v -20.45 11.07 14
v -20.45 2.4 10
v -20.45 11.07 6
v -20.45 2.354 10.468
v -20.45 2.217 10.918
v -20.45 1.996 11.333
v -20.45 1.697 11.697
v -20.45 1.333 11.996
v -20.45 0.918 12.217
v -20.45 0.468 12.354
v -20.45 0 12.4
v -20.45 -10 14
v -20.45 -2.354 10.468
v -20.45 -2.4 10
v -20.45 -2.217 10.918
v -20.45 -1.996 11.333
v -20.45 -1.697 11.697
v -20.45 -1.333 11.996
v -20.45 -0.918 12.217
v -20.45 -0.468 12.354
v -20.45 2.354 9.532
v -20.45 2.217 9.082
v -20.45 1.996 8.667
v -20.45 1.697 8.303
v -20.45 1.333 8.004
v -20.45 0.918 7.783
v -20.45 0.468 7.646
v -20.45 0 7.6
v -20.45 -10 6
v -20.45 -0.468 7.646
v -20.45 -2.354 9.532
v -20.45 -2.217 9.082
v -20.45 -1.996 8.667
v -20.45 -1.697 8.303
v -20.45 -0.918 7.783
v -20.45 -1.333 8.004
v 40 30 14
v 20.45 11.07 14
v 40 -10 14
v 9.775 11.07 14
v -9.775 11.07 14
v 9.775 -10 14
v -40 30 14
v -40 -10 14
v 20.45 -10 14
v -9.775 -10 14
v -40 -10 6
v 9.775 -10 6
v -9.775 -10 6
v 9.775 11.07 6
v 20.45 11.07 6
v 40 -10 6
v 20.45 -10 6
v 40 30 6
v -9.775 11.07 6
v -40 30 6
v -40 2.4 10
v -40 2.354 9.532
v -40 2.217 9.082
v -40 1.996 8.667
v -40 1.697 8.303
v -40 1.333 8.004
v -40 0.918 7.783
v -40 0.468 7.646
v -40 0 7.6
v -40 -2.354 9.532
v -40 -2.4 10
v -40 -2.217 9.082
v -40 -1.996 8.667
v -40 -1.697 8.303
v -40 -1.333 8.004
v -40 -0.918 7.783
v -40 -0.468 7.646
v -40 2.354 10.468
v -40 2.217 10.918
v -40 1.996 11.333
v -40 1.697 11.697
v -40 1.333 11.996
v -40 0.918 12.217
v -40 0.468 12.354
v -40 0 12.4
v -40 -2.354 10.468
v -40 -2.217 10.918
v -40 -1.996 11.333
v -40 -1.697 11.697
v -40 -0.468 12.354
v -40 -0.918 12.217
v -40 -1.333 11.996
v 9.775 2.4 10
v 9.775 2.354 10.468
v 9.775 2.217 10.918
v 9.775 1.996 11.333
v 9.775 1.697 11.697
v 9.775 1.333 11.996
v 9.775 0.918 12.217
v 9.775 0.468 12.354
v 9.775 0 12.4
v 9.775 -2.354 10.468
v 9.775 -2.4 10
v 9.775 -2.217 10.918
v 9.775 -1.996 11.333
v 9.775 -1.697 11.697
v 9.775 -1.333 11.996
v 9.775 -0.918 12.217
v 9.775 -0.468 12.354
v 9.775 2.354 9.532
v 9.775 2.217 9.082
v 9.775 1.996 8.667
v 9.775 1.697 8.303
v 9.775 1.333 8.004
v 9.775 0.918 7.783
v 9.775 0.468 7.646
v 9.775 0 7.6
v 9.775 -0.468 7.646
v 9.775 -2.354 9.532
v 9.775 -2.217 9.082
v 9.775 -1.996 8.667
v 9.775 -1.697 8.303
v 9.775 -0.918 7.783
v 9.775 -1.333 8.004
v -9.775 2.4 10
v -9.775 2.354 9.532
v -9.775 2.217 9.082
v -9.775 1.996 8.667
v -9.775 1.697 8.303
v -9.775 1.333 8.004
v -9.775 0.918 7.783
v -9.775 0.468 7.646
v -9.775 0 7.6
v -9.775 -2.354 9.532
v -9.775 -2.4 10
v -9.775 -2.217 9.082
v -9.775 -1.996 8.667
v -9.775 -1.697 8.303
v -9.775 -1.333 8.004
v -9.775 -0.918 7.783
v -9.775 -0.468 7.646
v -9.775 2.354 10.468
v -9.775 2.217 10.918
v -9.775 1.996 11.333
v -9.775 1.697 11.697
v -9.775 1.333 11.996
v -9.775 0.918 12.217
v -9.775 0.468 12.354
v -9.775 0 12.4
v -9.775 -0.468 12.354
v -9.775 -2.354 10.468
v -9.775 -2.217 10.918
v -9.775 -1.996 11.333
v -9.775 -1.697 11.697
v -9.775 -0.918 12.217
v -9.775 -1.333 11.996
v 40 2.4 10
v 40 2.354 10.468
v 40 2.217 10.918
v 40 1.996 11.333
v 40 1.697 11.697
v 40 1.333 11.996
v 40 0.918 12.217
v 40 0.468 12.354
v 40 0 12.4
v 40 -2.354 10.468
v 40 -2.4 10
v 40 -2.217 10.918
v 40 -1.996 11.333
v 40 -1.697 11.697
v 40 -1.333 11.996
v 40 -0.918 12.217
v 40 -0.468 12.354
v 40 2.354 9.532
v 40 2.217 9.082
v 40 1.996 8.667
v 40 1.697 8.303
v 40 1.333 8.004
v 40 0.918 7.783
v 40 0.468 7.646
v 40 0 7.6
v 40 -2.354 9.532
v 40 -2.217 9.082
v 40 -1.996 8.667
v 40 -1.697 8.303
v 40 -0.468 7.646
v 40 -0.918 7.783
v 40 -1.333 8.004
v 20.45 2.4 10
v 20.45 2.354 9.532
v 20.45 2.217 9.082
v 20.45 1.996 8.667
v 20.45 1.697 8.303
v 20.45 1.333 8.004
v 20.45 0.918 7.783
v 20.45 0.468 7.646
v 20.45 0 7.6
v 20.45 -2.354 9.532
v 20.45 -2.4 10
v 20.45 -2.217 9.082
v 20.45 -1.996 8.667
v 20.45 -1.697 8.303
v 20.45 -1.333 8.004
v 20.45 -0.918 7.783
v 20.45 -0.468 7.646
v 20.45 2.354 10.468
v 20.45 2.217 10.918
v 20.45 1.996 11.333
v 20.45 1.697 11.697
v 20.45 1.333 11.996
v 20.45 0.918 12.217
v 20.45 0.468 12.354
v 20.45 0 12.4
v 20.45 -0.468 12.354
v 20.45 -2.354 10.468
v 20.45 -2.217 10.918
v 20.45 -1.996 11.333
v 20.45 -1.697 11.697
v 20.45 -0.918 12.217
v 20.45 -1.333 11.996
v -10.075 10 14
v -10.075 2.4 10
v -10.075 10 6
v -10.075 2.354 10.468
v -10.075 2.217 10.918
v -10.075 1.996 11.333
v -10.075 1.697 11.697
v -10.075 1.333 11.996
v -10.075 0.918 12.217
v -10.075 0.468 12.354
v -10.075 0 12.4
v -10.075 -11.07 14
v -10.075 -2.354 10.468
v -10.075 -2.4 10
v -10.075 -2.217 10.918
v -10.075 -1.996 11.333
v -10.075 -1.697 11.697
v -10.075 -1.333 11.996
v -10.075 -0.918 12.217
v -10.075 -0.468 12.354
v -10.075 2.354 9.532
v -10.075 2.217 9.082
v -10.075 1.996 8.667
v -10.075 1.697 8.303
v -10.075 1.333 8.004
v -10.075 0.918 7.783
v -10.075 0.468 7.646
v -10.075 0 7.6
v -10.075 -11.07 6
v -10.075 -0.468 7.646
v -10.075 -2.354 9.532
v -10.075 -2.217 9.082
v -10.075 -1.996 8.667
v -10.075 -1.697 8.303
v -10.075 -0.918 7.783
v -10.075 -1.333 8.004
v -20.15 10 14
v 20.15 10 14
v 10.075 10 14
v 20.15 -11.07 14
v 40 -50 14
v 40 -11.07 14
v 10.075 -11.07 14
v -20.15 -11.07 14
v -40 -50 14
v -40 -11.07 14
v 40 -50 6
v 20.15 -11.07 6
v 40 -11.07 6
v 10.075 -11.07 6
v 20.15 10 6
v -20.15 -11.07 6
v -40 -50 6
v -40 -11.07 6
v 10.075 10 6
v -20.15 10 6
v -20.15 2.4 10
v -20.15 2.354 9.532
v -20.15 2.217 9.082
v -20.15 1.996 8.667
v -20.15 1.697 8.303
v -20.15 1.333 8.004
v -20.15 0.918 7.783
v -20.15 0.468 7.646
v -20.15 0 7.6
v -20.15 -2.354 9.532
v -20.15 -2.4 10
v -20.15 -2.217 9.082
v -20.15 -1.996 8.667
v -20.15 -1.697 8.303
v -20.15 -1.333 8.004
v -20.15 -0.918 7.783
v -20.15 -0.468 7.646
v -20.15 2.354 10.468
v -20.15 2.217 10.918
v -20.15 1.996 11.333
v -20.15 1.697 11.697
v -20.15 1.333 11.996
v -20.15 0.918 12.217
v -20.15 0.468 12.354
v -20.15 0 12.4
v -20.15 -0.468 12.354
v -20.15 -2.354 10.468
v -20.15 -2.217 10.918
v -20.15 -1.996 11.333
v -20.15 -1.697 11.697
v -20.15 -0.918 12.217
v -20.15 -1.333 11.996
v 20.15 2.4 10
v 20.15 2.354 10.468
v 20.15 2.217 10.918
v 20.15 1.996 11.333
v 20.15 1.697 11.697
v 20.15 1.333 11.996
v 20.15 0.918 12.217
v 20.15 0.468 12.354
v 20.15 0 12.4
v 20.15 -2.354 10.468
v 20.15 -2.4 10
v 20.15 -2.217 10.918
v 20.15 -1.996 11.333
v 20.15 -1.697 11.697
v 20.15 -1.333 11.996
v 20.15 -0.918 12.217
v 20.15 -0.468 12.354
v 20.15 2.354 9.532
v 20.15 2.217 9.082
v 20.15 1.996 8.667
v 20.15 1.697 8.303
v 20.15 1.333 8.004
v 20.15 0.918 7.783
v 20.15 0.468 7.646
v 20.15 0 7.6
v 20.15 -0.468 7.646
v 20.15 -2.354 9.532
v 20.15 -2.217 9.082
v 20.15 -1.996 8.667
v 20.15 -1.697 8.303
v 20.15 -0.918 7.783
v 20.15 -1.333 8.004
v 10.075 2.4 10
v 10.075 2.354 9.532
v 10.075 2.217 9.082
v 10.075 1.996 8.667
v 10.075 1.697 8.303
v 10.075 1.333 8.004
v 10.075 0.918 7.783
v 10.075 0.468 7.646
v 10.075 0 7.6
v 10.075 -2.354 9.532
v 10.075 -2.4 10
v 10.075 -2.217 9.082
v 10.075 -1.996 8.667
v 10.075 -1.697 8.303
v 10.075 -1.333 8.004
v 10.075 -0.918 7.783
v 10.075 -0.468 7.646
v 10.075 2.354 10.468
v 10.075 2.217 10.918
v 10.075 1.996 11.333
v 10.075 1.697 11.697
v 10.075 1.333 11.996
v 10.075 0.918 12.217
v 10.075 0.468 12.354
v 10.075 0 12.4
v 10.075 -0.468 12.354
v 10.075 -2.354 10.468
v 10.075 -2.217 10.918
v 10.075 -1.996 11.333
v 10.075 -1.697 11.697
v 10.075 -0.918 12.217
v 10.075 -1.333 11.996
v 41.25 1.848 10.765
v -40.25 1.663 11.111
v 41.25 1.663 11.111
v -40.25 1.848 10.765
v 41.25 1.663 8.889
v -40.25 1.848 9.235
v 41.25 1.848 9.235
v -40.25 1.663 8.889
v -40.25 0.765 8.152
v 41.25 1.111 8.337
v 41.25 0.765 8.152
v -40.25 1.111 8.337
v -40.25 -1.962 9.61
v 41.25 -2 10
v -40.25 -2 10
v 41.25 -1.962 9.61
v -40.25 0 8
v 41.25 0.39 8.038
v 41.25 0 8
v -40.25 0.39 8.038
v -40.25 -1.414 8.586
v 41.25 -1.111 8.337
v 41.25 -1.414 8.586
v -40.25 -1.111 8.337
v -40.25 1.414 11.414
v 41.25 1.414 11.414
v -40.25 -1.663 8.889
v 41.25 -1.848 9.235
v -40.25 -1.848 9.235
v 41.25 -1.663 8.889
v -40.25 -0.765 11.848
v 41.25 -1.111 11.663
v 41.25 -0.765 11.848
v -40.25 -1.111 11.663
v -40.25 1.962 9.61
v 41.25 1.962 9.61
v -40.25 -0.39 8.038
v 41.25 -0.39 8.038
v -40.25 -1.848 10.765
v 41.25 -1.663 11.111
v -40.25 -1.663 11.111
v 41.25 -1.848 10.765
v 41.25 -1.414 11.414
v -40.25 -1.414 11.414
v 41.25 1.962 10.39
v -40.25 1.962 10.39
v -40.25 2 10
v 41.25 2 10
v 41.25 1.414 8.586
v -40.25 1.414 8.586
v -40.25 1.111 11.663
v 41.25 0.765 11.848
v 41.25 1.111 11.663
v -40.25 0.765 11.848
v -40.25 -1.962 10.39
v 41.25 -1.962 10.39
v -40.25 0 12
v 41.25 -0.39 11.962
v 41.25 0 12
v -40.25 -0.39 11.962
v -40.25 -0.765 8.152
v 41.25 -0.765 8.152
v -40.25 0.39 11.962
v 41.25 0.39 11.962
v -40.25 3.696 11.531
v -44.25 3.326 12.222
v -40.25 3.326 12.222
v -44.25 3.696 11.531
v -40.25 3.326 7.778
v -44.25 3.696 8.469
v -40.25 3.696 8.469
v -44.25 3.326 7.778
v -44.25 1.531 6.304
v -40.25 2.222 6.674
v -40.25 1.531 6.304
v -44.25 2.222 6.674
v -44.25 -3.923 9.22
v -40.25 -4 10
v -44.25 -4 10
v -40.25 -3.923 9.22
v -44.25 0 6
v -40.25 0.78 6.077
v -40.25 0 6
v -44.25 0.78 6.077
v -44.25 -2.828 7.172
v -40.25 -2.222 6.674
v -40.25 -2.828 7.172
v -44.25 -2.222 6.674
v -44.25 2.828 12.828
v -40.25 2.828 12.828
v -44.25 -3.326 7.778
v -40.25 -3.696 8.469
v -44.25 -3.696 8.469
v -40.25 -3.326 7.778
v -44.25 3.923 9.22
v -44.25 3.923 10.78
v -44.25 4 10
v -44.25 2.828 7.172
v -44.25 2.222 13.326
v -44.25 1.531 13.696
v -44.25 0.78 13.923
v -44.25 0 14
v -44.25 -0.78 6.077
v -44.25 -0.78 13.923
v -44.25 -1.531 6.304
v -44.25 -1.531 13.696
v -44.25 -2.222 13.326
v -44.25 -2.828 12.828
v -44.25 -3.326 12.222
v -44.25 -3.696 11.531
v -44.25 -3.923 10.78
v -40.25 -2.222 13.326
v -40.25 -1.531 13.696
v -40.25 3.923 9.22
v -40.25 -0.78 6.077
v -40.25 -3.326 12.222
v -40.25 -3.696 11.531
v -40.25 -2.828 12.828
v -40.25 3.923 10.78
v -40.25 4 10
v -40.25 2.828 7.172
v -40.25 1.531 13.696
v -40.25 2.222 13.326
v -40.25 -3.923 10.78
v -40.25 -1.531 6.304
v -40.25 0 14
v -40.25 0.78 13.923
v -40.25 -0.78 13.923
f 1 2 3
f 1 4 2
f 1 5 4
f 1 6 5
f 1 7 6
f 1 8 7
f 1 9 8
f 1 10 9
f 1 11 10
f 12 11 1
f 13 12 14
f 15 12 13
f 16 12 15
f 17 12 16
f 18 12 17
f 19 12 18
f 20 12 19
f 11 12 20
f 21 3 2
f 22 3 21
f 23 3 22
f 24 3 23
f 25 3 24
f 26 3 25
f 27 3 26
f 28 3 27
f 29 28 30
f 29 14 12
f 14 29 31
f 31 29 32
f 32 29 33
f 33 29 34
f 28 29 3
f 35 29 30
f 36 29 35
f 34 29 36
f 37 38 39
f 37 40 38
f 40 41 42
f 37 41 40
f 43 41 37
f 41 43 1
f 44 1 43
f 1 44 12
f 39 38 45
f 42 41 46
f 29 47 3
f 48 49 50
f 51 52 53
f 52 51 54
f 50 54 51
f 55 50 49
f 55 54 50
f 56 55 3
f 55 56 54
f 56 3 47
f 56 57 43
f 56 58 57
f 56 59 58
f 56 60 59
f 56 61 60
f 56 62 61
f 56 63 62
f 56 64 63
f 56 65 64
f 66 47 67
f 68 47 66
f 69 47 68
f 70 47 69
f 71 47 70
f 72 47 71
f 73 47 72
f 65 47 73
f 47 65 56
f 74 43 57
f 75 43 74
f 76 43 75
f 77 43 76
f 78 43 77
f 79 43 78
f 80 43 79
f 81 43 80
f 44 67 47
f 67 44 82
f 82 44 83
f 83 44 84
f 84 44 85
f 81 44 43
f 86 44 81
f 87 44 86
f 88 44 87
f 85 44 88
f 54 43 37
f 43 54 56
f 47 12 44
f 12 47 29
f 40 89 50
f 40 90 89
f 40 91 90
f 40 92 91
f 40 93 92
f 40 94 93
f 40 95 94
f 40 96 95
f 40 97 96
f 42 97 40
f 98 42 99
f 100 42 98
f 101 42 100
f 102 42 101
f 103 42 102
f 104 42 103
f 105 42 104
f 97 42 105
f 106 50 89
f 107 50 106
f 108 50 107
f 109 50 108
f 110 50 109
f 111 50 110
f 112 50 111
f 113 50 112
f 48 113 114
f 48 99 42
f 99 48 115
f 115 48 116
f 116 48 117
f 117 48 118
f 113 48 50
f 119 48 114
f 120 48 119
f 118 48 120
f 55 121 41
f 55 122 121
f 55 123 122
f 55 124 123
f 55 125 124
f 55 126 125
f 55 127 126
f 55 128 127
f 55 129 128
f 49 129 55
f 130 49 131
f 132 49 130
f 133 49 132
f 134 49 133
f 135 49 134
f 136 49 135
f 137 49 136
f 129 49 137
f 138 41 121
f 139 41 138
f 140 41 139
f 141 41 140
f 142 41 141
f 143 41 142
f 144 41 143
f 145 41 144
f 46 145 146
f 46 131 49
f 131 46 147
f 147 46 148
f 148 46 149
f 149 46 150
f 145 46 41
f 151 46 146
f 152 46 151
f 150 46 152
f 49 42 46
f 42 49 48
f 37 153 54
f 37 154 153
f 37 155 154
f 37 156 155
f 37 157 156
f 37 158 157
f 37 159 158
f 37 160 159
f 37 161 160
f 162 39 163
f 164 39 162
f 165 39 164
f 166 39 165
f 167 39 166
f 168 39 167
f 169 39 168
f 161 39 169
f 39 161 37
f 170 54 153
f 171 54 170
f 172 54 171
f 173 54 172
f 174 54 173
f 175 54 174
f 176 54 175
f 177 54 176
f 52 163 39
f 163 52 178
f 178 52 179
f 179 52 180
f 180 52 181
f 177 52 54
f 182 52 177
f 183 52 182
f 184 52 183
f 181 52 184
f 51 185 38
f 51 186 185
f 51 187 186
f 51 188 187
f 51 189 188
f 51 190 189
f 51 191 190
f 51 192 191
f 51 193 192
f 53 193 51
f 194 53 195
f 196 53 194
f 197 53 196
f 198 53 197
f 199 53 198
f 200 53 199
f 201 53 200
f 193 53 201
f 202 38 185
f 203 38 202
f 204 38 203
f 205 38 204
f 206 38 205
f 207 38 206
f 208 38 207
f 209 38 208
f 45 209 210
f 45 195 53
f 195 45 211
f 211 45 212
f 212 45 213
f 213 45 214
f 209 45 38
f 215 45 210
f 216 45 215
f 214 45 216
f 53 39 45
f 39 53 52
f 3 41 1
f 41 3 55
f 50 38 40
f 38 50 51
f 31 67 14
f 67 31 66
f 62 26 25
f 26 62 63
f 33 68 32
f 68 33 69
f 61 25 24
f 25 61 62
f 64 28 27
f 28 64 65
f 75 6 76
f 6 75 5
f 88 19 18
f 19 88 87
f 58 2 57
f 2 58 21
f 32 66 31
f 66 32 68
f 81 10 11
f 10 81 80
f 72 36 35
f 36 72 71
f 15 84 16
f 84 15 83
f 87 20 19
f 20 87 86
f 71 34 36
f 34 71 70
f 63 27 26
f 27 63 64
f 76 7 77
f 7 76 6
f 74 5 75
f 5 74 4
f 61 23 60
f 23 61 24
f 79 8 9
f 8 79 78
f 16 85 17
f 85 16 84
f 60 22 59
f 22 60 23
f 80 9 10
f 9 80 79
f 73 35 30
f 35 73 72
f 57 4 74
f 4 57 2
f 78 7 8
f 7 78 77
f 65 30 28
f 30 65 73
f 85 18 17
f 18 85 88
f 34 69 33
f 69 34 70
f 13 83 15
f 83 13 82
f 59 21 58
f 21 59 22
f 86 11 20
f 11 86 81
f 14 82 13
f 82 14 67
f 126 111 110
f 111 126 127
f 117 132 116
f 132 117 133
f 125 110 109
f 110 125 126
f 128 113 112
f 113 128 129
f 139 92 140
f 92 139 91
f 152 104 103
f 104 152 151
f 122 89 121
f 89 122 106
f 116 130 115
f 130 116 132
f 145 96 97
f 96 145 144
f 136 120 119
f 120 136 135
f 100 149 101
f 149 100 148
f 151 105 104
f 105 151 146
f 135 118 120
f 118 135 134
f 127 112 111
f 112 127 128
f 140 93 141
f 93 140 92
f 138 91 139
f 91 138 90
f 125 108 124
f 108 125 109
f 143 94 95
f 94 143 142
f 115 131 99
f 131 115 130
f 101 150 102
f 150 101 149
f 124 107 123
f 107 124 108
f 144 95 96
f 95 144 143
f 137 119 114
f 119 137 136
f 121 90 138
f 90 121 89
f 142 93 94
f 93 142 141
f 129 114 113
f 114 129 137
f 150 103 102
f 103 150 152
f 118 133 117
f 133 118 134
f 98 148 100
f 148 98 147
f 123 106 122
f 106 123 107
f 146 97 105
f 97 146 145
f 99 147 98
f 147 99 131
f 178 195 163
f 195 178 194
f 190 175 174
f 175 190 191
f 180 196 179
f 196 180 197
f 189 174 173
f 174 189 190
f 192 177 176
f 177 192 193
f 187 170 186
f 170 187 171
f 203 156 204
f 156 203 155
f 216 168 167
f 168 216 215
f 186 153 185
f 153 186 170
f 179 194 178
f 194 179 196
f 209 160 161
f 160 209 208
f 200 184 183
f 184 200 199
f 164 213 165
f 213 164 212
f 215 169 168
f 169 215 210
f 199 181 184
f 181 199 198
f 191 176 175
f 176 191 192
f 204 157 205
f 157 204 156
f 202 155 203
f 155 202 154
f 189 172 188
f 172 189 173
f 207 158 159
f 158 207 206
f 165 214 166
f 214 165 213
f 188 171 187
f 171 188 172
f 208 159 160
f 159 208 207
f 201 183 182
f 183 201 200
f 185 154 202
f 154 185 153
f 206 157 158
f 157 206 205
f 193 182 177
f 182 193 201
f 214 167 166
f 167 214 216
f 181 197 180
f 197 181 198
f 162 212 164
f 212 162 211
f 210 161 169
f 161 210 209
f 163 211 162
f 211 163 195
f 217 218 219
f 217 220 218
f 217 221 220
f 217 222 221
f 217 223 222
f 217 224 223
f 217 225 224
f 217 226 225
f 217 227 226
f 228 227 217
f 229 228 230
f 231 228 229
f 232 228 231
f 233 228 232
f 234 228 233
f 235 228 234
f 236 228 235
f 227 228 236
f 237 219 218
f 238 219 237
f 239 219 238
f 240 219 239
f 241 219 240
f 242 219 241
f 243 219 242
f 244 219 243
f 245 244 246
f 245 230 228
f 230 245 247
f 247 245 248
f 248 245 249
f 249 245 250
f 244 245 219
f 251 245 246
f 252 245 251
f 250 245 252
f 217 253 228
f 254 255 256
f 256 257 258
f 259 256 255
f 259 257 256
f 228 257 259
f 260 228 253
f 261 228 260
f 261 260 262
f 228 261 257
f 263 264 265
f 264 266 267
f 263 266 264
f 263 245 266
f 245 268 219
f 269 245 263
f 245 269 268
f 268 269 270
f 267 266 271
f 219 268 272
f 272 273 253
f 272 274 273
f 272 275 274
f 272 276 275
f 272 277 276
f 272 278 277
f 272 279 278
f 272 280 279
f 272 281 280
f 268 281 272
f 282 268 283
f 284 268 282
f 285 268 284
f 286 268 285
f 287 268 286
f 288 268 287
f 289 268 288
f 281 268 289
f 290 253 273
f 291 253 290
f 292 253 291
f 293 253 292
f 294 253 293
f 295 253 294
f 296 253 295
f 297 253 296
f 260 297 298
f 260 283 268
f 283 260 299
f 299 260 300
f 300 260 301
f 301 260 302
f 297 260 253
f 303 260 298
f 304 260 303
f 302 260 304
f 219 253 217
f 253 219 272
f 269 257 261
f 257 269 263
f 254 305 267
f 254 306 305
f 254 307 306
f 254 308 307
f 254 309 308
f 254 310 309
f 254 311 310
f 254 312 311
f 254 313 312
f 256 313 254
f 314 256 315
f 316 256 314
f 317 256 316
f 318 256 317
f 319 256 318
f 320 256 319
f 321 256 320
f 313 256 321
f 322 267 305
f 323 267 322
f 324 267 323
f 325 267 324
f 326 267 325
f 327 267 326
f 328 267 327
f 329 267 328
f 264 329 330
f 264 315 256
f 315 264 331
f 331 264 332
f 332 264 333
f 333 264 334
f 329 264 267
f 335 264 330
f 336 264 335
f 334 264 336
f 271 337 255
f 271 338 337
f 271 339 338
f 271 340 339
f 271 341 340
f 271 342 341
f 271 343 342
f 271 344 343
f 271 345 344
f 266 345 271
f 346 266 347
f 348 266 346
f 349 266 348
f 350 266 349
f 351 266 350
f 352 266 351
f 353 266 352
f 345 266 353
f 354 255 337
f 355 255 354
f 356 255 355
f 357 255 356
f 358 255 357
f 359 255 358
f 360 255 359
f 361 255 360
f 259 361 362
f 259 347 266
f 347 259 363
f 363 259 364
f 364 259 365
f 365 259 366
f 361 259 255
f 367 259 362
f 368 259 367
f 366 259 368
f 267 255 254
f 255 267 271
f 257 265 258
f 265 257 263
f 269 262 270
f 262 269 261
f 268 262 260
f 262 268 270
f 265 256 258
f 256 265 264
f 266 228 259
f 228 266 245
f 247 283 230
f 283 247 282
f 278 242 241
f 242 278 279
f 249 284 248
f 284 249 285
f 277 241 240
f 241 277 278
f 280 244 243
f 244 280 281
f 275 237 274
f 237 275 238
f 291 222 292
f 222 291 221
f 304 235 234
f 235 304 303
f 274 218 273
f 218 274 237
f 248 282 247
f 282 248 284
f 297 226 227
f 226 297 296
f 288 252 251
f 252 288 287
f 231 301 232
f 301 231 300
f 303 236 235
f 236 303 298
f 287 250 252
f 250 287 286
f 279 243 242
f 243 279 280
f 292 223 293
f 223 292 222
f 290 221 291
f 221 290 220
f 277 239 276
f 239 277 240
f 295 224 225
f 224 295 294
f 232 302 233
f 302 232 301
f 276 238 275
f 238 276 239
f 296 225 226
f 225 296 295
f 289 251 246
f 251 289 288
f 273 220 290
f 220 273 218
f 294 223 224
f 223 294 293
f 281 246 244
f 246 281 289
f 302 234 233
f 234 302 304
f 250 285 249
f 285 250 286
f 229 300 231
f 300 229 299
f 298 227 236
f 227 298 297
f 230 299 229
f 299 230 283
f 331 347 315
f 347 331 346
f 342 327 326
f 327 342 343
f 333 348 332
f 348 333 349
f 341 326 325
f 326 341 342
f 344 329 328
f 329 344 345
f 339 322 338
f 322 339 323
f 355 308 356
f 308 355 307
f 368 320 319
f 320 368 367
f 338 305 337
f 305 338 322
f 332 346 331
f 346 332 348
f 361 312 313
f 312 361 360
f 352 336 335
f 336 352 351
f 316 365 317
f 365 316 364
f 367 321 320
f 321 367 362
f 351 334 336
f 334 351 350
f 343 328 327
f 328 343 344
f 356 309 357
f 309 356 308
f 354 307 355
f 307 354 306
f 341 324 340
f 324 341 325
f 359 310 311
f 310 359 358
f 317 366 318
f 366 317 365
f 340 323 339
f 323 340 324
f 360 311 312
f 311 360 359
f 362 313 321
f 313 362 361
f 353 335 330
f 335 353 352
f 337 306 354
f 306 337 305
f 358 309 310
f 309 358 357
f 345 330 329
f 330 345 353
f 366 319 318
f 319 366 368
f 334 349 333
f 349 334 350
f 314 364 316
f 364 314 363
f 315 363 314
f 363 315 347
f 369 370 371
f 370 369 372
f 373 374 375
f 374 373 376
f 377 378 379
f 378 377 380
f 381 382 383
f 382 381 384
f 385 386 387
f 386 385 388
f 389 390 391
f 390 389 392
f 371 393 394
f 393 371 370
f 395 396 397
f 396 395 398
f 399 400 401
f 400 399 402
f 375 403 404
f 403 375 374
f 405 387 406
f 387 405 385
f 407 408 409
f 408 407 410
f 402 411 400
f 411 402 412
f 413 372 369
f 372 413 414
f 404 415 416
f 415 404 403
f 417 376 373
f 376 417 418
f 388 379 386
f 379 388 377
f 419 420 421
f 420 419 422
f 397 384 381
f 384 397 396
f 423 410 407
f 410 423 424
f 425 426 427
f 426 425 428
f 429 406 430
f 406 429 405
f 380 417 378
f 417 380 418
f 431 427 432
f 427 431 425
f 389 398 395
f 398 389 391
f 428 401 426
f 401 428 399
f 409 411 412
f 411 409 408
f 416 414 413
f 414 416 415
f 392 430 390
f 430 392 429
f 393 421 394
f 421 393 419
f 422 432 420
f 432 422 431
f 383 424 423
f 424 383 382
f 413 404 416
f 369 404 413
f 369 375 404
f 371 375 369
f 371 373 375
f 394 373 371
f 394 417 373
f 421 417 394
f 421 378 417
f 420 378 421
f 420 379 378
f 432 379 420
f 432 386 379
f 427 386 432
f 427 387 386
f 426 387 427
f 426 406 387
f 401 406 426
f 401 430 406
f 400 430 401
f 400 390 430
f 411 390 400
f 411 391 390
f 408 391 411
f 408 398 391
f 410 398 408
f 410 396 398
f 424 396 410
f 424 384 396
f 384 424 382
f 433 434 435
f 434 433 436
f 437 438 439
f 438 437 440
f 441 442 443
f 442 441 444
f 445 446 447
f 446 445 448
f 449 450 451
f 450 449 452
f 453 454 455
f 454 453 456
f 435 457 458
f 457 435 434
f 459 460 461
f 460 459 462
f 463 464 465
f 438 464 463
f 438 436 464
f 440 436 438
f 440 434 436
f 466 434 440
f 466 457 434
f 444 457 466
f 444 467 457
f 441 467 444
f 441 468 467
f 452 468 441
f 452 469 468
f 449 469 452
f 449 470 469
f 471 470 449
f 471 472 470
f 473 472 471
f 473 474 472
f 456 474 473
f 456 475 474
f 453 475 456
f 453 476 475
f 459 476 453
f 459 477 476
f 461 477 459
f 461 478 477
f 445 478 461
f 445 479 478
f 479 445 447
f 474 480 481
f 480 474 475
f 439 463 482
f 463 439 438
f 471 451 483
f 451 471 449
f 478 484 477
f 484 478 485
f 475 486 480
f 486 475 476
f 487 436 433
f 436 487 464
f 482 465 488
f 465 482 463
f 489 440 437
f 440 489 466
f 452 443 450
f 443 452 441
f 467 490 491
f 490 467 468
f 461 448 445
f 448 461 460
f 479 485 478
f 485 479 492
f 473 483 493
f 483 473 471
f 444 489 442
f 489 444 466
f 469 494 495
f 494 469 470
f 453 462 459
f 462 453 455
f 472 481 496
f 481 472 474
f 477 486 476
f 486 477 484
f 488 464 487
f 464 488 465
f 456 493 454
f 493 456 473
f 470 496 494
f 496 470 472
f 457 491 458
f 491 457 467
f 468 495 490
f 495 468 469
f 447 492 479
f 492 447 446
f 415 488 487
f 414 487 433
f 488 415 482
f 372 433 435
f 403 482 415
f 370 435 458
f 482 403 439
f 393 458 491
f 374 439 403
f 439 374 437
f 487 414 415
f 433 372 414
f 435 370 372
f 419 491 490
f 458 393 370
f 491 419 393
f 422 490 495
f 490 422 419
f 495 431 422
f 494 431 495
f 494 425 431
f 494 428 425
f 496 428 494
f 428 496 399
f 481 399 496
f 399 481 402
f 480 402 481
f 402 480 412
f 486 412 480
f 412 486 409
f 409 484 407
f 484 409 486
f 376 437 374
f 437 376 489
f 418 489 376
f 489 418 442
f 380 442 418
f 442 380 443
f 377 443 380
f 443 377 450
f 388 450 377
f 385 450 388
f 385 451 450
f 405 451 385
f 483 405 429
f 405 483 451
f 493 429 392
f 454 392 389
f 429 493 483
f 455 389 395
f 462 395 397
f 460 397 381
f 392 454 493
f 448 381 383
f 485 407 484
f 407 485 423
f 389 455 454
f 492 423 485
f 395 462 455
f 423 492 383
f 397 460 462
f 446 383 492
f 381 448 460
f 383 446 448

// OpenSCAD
$fn = 32;

// ------------------------------------------------------------------------
// Butt hinge: hinge 80 mm, leaf swung 0 deg
// Every part is its own module, assembly() places every instance.
// ------------------------------------------------------------------------

// --- part 1 ---
module hinge_base() {
  difference() {
    union() {
      translate([-40, -10, -4]) cube([19.55, 40, 8]);
      translate([-9.775, -10, -4]) cube([19.55, 40, 8]);
      translate([20.45, -10, -4]) cube([19.55, 40, 8]);
      translate([-40, 11.07, -4]) cube([80, 18.93, 8]);
    }
    translate([-30.225, 0, 0]) rotate([0, 90, 0]) cylinder(h = 21.55, d = 4.8, center = true);
    translate([0, 0, 0]) rotate([0, 90, 0]) cylinder(h = 21.55, d = 4.8, center = true);
    translate([30.225, 0, 0]) rotate([0, 90, 0]) cylinder(h = 21.55, d = 4.8, center = true);
  }
}

// --- part 2 ---
module hinge_mover() {
  difference() {
    union() {
      translate([-20.15, -50, -4]) cube([10.075, 60, 8]);
      translate([10.075, -50, -4]) cube([10.075, 60, 8]);
      translate([-40, -50, -4]) cube([80, 38.93, 8]);
    }
    translate([-15.113, 0, 0]) rotate([0, 90, 0]) cylinder(h = 12.075, d = 4.8, center = true);
    translate([15.113, 0, 0]) rotate([0, 90, 0]) cylinder(h = 12.075, d = 4.8, center = true);
  }
}

// --- part 3 ---
module hinge_pin() {
  rotate([0, 90, 0]) cylinder(h = 82.5, d = 4, center = true);
  translate([-44.25, 0, 0]) rotate([0, 90, 0]) cylinder(h = 4, d = 8);
}

// --- assembly ---
module assembly() {
  color([0.80, 0.24, 0.20]) translate([0, 0, 10]) rotate([0, 0, 0]) hinge_base();
  color([0.20, 0.45, 0.75]) translate([0, 0, 10]) rotate([0, 0, 0]) hinge_mover();
  color([0.25, 0.62, 0.32]) translate([0, 0, 10]) rotate([0, 0, 0]) hinge_pin();
}

assembly();
